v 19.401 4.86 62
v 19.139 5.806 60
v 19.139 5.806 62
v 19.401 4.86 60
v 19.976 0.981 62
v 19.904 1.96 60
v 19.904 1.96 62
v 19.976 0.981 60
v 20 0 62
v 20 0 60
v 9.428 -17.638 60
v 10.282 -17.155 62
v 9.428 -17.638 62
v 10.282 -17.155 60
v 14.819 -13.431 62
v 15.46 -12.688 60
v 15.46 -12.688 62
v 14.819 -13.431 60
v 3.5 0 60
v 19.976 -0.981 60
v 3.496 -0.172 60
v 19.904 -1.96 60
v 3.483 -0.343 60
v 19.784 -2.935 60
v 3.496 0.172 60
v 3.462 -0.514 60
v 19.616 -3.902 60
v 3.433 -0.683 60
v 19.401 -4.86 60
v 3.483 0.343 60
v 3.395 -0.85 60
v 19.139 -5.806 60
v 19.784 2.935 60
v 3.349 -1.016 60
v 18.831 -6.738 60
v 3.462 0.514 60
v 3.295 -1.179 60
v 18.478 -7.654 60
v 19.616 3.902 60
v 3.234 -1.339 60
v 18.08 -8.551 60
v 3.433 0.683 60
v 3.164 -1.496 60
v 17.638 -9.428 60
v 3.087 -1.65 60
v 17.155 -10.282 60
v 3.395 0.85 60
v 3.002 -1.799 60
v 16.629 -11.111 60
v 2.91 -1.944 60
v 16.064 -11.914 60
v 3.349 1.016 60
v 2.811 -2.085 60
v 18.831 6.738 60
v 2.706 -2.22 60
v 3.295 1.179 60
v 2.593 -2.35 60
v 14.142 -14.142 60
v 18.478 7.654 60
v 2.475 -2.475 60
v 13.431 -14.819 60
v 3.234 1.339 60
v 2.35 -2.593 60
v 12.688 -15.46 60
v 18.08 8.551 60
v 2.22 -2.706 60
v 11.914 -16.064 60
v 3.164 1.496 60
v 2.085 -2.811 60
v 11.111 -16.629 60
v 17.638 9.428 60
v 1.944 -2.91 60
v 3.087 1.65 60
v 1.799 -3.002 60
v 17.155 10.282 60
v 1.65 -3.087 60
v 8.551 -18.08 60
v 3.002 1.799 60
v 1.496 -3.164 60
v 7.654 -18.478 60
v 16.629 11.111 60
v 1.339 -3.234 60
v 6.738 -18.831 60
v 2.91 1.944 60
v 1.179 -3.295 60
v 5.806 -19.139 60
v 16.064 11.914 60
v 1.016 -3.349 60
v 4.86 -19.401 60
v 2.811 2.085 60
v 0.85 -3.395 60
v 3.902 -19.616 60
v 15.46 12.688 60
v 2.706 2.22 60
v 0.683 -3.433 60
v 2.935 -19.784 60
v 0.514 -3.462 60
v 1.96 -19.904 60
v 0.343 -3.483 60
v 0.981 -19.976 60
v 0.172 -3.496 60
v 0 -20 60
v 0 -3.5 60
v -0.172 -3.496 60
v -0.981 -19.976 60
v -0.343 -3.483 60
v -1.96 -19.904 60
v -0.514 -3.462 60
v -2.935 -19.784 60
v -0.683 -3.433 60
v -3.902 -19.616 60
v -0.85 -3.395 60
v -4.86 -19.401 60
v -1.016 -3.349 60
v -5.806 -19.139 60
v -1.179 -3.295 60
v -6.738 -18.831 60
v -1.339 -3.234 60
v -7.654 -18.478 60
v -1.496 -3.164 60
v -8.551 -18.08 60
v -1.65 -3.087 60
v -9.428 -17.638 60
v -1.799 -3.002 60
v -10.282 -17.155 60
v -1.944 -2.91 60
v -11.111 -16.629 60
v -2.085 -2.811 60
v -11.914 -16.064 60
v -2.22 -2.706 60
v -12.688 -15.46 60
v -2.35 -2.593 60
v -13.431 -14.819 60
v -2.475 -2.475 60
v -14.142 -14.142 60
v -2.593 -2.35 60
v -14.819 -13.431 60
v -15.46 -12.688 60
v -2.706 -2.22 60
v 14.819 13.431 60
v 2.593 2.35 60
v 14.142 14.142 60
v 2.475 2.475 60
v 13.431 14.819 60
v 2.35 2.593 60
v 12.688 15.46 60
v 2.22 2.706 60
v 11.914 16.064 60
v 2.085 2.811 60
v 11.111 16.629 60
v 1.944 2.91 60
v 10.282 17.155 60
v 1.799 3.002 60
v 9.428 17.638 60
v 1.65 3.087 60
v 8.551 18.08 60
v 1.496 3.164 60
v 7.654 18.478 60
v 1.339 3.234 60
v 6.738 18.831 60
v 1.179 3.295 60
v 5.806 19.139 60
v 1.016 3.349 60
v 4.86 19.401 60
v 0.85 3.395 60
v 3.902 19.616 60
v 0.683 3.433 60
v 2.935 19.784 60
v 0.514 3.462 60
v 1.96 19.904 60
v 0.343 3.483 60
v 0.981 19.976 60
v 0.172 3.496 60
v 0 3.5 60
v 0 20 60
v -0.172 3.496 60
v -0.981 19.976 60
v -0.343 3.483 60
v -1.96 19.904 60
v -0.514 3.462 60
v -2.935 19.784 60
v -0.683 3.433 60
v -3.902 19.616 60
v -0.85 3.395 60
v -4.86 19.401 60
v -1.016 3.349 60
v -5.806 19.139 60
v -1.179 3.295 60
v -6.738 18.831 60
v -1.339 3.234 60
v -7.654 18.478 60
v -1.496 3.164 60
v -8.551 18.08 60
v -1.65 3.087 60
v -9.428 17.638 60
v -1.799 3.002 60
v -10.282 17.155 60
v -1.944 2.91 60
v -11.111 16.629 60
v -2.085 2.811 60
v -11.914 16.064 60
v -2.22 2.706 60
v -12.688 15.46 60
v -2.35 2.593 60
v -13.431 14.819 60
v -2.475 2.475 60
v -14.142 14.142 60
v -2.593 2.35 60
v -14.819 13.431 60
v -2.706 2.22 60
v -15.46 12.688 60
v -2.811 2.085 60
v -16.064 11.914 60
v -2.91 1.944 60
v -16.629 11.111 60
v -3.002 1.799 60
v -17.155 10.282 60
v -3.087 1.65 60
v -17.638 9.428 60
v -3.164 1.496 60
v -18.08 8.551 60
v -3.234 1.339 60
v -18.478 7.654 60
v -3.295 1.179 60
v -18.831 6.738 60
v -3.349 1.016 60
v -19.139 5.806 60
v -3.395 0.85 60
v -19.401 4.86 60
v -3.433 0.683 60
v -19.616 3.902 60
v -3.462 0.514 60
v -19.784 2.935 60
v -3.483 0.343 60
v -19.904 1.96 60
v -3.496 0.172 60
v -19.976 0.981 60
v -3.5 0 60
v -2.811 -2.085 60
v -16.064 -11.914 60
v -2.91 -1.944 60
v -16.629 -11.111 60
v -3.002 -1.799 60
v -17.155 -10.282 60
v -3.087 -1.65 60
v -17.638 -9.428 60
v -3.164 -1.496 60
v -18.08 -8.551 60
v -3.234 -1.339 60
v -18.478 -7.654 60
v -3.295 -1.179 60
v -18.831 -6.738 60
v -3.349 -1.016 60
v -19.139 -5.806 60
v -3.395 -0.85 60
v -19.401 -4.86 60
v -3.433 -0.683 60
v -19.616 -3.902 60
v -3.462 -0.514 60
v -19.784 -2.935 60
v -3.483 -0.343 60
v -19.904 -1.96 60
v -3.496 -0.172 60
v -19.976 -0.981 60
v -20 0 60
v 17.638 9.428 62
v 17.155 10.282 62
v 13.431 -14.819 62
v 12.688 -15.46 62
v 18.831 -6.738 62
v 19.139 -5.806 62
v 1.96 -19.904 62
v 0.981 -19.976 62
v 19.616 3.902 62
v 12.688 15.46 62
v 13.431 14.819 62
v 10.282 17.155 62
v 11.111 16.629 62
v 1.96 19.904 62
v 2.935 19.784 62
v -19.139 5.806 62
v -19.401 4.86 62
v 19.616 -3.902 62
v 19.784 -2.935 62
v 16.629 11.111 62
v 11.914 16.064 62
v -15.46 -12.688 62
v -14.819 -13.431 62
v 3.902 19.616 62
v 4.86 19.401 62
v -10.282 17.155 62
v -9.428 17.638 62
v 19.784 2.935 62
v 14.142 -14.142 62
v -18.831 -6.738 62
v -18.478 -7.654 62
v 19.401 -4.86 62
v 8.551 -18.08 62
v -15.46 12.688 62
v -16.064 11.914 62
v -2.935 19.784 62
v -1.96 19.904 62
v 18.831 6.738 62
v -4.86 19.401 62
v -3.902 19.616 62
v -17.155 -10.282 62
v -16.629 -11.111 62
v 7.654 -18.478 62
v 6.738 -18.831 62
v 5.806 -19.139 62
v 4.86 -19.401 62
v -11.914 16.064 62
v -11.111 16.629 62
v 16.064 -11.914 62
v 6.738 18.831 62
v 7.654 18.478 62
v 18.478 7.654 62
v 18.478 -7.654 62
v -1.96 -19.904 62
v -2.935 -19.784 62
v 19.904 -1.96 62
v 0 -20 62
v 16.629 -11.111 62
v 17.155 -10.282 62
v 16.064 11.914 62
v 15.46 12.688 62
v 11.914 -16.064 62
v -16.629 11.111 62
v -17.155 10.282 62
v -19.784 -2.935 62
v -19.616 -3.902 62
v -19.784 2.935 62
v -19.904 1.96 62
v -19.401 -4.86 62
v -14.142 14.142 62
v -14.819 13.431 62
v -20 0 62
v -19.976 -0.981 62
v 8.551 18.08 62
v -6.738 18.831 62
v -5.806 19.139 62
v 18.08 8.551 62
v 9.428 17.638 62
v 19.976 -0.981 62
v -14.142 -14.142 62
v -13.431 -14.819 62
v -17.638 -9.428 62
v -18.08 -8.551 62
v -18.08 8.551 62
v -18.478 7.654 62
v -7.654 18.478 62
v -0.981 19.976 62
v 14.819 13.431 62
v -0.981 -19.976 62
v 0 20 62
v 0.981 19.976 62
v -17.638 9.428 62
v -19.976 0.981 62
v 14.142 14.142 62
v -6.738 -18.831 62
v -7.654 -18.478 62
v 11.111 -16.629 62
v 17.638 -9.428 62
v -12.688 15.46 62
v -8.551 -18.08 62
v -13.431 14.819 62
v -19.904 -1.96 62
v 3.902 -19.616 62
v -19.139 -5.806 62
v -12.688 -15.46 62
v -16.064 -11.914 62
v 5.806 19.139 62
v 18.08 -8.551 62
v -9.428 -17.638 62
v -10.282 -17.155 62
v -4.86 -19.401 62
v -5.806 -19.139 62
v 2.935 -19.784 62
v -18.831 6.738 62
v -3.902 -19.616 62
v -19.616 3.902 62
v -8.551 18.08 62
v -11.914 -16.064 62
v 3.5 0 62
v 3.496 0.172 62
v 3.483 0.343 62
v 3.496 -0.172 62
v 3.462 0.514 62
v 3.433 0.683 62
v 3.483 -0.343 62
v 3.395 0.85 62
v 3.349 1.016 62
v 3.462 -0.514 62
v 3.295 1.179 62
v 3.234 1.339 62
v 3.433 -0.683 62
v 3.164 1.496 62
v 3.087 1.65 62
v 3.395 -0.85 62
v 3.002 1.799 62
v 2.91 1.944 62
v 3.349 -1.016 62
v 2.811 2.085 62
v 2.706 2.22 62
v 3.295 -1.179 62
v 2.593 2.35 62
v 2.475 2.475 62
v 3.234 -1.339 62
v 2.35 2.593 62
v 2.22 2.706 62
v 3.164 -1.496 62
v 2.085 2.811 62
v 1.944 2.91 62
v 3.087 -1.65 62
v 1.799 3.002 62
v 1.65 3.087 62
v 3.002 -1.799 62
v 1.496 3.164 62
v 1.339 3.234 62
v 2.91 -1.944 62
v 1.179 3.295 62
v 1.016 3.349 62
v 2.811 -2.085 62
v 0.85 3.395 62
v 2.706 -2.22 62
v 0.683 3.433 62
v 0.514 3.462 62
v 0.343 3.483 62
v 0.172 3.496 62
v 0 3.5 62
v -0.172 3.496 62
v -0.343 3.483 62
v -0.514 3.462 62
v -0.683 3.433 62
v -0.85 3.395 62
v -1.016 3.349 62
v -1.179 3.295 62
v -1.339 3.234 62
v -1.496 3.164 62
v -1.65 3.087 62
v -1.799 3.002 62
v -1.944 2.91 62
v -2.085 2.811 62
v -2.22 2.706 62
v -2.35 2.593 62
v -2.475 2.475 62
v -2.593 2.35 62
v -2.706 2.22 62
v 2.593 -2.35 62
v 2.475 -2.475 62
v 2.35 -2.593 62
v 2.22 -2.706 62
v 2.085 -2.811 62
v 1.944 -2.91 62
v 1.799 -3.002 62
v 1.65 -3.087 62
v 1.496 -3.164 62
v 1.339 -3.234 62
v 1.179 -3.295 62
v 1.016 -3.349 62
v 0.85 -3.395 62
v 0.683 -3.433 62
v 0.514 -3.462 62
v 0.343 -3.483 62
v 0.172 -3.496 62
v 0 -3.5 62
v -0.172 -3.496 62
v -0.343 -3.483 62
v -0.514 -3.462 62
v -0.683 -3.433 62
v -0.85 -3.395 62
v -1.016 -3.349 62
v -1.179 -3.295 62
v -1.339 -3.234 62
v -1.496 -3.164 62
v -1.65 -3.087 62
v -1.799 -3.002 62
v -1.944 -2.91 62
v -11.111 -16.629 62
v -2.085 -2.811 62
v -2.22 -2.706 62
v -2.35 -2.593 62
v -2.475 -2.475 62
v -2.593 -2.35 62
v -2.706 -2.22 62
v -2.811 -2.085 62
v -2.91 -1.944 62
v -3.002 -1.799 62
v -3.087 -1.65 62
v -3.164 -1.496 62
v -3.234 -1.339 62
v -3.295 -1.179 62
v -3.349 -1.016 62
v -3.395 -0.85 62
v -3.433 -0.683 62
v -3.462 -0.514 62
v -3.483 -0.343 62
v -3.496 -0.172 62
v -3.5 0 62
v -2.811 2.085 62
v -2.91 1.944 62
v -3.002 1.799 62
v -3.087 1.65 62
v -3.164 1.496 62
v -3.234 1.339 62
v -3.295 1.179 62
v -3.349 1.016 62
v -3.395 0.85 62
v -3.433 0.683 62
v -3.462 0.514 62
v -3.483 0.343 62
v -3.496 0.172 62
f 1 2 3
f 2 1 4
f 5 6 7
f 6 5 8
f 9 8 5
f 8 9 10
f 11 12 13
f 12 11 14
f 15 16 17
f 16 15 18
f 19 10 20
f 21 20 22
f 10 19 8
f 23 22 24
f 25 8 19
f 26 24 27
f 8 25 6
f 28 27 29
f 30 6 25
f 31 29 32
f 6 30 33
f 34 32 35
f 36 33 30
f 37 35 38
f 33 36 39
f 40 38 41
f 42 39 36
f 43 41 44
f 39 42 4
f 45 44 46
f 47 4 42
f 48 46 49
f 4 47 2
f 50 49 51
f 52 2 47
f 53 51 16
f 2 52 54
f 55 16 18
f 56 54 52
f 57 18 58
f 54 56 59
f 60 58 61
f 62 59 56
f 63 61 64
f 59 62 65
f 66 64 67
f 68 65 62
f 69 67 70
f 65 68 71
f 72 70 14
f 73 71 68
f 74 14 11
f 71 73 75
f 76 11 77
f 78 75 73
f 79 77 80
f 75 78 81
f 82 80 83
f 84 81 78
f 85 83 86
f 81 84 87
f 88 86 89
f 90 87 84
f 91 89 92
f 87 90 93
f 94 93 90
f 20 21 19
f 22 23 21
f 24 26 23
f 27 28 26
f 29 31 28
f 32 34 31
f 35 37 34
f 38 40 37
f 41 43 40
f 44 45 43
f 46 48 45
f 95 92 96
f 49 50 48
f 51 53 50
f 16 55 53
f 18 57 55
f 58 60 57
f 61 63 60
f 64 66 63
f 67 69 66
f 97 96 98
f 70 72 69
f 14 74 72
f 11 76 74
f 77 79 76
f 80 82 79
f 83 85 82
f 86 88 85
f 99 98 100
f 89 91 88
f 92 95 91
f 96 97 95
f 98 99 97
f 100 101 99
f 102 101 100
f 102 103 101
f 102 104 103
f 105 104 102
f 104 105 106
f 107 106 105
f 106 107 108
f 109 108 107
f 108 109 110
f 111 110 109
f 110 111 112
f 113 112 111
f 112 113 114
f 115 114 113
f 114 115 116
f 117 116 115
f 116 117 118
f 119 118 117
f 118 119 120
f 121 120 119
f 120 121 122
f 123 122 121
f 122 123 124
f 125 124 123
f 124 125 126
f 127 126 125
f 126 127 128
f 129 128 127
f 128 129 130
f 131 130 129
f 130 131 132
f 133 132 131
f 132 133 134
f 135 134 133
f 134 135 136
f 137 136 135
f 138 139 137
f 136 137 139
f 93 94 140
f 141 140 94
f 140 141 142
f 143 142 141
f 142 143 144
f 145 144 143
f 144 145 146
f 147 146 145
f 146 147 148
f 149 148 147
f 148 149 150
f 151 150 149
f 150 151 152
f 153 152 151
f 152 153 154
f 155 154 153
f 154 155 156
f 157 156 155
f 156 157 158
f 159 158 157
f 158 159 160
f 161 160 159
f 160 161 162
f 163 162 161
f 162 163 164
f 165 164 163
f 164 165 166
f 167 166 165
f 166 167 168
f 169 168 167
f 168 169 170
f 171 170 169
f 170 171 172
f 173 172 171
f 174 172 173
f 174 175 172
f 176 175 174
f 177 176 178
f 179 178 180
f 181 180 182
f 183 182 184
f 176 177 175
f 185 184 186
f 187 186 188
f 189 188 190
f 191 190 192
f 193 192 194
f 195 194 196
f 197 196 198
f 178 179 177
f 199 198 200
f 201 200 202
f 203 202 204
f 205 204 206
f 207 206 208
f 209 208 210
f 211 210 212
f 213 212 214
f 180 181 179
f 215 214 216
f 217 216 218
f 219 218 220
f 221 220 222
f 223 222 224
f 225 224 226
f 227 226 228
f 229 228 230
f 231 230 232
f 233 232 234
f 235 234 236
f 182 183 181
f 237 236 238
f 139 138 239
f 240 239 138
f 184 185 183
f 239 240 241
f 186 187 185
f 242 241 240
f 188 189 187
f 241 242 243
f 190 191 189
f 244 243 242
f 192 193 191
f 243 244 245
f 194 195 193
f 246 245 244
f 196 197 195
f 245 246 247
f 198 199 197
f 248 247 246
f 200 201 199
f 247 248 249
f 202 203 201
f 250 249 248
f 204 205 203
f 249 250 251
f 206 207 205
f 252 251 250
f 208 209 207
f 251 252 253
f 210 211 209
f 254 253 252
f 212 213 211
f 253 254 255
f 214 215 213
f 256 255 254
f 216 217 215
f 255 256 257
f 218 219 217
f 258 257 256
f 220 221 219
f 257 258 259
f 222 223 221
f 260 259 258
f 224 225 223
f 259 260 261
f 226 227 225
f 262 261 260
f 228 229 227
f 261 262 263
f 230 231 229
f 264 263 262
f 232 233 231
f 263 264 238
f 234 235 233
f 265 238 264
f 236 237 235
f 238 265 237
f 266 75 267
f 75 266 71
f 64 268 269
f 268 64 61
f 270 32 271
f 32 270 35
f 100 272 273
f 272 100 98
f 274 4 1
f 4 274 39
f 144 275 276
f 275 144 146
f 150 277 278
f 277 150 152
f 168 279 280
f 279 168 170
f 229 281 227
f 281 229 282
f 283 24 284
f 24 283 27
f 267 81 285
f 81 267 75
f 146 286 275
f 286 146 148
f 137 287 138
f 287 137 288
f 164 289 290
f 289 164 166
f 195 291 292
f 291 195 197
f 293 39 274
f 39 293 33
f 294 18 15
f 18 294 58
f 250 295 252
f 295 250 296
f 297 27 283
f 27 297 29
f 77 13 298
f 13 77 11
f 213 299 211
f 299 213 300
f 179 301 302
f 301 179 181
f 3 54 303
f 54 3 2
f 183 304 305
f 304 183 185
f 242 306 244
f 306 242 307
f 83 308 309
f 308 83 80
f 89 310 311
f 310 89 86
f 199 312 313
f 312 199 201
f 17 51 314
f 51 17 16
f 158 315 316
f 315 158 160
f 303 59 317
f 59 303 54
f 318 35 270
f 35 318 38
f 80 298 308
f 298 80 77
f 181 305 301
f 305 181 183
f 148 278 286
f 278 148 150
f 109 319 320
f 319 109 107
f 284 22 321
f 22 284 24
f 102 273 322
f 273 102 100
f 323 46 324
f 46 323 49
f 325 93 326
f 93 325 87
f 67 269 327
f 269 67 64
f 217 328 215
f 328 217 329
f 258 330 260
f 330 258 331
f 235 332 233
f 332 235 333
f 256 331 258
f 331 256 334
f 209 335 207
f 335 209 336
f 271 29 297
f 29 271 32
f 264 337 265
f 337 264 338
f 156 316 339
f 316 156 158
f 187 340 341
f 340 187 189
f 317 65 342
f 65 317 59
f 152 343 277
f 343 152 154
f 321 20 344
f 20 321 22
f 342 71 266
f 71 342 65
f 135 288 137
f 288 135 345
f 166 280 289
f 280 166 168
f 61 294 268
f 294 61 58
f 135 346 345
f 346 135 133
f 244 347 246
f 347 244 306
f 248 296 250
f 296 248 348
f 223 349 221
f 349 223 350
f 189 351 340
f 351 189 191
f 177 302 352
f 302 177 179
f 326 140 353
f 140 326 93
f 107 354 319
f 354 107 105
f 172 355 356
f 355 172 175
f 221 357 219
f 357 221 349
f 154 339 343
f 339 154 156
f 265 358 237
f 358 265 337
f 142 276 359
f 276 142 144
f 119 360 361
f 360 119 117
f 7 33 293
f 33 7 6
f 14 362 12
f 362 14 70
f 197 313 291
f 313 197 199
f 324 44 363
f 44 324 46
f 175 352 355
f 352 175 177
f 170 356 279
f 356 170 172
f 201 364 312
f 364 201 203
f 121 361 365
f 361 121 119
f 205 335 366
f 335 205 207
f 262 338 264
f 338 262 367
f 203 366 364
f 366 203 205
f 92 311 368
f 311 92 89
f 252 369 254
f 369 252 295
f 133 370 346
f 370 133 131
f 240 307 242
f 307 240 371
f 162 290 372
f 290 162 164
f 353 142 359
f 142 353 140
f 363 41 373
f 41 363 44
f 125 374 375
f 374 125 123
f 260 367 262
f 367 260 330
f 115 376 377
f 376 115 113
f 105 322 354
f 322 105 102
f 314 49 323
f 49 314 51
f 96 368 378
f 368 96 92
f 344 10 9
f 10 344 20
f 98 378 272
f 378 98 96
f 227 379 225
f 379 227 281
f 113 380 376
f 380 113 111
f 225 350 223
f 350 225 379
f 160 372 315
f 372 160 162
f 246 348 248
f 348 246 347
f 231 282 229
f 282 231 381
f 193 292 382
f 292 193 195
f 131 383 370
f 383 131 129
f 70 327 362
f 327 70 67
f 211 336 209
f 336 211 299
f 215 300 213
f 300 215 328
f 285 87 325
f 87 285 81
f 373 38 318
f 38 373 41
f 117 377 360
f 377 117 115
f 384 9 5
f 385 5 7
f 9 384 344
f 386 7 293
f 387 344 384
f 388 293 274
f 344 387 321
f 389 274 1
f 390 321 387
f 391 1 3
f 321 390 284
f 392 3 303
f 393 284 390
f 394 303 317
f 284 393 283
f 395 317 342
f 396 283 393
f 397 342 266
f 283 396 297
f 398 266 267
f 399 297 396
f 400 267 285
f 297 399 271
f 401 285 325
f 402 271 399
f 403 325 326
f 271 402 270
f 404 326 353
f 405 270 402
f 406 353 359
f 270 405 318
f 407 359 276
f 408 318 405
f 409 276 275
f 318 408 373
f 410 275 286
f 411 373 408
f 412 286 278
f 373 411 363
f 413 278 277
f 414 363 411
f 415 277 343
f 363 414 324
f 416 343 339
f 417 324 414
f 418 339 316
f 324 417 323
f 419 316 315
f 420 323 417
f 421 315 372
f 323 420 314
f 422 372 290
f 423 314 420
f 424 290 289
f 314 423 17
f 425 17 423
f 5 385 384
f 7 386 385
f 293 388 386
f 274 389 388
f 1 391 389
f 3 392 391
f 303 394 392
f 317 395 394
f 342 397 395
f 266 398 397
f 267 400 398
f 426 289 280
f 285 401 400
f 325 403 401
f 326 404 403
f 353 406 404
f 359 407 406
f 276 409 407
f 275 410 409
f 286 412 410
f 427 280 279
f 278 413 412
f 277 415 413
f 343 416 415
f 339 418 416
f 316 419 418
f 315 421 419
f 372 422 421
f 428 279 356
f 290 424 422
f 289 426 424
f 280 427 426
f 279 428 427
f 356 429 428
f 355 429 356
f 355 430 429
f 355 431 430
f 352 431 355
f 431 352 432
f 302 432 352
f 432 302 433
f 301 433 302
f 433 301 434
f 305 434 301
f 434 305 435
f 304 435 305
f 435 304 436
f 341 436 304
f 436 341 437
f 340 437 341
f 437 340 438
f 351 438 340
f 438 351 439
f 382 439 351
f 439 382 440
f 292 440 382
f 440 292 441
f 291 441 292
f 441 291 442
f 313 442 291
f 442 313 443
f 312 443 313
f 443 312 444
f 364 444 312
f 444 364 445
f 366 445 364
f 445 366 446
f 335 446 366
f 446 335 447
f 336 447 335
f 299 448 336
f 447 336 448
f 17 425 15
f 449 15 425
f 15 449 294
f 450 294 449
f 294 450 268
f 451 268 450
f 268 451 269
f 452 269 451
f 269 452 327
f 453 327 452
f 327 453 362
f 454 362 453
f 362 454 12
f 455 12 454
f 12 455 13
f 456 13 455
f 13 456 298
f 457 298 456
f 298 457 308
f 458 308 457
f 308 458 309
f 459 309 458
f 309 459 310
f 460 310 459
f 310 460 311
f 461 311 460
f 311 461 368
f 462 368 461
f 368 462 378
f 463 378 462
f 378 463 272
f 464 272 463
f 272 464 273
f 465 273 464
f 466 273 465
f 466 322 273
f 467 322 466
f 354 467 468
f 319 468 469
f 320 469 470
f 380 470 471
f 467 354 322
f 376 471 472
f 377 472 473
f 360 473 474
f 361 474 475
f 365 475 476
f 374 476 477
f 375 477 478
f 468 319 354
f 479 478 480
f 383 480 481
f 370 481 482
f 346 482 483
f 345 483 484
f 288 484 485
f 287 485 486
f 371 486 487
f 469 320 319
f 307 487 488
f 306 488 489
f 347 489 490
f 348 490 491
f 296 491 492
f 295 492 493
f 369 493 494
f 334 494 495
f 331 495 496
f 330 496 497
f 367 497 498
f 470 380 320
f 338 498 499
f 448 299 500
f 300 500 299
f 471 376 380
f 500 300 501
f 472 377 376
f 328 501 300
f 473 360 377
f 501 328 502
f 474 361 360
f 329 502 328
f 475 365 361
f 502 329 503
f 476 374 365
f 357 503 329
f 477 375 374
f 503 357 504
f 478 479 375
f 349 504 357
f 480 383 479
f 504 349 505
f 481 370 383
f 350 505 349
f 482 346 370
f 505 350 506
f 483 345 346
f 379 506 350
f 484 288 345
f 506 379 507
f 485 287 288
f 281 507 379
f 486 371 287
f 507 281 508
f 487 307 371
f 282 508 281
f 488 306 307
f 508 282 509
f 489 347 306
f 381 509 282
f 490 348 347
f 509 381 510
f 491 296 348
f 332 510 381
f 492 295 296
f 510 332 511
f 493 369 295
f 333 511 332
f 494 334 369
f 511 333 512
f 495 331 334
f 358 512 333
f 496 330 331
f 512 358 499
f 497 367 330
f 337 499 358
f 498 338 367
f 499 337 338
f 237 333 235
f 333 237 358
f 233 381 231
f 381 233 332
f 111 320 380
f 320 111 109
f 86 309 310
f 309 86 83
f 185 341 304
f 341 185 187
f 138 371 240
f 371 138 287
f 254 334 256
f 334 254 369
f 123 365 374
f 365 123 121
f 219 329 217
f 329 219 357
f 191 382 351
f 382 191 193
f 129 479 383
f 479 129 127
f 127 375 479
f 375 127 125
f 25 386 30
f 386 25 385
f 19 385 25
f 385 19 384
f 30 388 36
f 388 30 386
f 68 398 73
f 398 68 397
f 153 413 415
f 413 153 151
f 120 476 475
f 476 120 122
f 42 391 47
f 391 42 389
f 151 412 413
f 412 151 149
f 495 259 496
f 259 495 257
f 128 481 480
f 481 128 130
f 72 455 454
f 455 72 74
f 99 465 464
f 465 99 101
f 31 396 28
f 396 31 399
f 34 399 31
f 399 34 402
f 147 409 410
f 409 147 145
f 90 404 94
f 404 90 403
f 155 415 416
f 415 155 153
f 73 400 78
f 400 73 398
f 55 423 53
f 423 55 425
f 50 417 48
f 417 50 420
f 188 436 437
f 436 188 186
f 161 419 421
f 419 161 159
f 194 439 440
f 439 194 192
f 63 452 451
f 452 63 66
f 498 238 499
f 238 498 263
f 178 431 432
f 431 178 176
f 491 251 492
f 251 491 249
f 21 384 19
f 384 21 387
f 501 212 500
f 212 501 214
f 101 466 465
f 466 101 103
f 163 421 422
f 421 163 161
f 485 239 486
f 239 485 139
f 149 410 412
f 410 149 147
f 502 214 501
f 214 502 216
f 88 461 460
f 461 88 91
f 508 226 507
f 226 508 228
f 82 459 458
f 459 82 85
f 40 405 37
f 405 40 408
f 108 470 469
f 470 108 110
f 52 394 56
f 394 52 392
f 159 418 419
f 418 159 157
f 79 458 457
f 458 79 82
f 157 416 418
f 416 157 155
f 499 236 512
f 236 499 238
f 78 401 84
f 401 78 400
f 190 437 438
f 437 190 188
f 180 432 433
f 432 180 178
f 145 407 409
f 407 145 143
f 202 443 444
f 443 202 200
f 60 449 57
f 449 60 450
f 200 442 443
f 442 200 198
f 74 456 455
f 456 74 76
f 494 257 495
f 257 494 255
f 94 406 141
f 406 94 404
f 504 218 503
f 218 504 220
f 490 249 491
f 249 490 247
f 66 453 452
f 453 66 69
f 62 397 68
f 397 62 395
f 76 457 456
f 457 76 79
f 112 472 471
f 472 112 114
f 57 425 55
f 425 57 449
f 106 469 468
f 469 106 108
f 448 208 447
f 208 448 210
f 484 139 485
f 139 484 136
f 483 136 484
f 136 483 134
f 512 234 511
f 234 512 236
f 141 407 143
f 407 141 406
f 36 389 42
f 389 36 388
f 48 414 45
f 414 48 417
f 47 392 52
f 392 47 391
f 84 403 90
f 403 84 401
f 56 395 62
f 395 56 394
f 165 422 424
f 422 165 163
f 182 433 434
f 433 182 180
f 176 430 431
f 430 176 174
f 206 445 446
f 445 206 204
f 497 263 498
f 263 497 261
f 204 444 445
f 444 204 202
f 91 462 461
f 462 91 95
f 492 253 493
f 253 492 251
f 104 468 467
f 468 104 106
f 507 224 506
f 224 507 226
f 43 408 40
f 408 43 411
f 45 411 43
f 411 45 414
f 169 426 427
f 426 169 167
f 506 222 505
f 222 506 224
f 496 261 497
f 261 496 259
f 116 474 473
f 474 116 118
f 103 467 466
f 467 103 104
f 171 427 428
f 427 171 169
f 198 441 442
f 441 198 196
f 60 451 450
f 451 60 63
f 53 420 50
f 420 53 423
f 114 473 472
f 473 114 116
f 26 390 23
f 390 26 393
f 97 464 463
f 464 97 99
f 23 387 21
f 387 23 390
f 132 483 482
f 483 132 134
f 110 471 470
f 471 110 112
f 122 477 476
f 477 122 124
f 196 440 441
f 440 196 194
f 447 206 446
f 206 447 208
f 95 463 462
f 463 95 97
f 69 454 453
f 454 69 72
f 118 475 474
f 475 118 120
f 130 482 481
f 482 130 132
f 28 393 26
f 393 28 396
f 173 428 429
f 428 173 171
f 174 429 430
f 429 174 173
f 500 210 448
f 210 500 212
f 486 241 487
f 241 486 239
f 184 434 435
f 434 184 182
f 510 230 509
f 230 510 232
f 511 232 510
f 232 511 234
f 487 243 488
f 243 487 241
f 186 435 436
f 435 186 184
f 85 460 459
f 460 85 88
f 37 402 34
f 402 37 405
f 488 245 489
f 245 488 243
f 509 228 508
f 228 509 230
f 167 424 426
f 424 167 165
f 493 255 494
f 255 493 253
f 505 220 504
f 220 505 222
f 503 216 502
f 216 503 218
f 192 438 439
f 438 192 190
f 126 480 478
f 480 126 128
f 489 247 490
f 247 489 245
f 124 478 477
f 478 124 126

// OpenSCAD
// file: common_params.scad
cylinder_radius = 20.000000;
cylinder_height = 60.000000;
wall_thickness = 2.000000;

cap_thickness = 2.000000;

rod_radius = 2.000000;
rod_height = 50.000000;

ring_outer_radius = 8.000000;
ring_inner_radius = 4.000000;
ring_thickness = 3.000000;
ring_z = 40.000000;

$fn = 128;
// main file
include <common_params.scad>;

hole_radius = 3.500000;

translate([0, 0, cylinder_height])
difference() {
    cylinder(h = cap_thickness, r = cylinder_radius);
    translate([0, 0, -0.1])
        cylinder(h = cap_thickness + 0.2, r = hole_radius);
}
